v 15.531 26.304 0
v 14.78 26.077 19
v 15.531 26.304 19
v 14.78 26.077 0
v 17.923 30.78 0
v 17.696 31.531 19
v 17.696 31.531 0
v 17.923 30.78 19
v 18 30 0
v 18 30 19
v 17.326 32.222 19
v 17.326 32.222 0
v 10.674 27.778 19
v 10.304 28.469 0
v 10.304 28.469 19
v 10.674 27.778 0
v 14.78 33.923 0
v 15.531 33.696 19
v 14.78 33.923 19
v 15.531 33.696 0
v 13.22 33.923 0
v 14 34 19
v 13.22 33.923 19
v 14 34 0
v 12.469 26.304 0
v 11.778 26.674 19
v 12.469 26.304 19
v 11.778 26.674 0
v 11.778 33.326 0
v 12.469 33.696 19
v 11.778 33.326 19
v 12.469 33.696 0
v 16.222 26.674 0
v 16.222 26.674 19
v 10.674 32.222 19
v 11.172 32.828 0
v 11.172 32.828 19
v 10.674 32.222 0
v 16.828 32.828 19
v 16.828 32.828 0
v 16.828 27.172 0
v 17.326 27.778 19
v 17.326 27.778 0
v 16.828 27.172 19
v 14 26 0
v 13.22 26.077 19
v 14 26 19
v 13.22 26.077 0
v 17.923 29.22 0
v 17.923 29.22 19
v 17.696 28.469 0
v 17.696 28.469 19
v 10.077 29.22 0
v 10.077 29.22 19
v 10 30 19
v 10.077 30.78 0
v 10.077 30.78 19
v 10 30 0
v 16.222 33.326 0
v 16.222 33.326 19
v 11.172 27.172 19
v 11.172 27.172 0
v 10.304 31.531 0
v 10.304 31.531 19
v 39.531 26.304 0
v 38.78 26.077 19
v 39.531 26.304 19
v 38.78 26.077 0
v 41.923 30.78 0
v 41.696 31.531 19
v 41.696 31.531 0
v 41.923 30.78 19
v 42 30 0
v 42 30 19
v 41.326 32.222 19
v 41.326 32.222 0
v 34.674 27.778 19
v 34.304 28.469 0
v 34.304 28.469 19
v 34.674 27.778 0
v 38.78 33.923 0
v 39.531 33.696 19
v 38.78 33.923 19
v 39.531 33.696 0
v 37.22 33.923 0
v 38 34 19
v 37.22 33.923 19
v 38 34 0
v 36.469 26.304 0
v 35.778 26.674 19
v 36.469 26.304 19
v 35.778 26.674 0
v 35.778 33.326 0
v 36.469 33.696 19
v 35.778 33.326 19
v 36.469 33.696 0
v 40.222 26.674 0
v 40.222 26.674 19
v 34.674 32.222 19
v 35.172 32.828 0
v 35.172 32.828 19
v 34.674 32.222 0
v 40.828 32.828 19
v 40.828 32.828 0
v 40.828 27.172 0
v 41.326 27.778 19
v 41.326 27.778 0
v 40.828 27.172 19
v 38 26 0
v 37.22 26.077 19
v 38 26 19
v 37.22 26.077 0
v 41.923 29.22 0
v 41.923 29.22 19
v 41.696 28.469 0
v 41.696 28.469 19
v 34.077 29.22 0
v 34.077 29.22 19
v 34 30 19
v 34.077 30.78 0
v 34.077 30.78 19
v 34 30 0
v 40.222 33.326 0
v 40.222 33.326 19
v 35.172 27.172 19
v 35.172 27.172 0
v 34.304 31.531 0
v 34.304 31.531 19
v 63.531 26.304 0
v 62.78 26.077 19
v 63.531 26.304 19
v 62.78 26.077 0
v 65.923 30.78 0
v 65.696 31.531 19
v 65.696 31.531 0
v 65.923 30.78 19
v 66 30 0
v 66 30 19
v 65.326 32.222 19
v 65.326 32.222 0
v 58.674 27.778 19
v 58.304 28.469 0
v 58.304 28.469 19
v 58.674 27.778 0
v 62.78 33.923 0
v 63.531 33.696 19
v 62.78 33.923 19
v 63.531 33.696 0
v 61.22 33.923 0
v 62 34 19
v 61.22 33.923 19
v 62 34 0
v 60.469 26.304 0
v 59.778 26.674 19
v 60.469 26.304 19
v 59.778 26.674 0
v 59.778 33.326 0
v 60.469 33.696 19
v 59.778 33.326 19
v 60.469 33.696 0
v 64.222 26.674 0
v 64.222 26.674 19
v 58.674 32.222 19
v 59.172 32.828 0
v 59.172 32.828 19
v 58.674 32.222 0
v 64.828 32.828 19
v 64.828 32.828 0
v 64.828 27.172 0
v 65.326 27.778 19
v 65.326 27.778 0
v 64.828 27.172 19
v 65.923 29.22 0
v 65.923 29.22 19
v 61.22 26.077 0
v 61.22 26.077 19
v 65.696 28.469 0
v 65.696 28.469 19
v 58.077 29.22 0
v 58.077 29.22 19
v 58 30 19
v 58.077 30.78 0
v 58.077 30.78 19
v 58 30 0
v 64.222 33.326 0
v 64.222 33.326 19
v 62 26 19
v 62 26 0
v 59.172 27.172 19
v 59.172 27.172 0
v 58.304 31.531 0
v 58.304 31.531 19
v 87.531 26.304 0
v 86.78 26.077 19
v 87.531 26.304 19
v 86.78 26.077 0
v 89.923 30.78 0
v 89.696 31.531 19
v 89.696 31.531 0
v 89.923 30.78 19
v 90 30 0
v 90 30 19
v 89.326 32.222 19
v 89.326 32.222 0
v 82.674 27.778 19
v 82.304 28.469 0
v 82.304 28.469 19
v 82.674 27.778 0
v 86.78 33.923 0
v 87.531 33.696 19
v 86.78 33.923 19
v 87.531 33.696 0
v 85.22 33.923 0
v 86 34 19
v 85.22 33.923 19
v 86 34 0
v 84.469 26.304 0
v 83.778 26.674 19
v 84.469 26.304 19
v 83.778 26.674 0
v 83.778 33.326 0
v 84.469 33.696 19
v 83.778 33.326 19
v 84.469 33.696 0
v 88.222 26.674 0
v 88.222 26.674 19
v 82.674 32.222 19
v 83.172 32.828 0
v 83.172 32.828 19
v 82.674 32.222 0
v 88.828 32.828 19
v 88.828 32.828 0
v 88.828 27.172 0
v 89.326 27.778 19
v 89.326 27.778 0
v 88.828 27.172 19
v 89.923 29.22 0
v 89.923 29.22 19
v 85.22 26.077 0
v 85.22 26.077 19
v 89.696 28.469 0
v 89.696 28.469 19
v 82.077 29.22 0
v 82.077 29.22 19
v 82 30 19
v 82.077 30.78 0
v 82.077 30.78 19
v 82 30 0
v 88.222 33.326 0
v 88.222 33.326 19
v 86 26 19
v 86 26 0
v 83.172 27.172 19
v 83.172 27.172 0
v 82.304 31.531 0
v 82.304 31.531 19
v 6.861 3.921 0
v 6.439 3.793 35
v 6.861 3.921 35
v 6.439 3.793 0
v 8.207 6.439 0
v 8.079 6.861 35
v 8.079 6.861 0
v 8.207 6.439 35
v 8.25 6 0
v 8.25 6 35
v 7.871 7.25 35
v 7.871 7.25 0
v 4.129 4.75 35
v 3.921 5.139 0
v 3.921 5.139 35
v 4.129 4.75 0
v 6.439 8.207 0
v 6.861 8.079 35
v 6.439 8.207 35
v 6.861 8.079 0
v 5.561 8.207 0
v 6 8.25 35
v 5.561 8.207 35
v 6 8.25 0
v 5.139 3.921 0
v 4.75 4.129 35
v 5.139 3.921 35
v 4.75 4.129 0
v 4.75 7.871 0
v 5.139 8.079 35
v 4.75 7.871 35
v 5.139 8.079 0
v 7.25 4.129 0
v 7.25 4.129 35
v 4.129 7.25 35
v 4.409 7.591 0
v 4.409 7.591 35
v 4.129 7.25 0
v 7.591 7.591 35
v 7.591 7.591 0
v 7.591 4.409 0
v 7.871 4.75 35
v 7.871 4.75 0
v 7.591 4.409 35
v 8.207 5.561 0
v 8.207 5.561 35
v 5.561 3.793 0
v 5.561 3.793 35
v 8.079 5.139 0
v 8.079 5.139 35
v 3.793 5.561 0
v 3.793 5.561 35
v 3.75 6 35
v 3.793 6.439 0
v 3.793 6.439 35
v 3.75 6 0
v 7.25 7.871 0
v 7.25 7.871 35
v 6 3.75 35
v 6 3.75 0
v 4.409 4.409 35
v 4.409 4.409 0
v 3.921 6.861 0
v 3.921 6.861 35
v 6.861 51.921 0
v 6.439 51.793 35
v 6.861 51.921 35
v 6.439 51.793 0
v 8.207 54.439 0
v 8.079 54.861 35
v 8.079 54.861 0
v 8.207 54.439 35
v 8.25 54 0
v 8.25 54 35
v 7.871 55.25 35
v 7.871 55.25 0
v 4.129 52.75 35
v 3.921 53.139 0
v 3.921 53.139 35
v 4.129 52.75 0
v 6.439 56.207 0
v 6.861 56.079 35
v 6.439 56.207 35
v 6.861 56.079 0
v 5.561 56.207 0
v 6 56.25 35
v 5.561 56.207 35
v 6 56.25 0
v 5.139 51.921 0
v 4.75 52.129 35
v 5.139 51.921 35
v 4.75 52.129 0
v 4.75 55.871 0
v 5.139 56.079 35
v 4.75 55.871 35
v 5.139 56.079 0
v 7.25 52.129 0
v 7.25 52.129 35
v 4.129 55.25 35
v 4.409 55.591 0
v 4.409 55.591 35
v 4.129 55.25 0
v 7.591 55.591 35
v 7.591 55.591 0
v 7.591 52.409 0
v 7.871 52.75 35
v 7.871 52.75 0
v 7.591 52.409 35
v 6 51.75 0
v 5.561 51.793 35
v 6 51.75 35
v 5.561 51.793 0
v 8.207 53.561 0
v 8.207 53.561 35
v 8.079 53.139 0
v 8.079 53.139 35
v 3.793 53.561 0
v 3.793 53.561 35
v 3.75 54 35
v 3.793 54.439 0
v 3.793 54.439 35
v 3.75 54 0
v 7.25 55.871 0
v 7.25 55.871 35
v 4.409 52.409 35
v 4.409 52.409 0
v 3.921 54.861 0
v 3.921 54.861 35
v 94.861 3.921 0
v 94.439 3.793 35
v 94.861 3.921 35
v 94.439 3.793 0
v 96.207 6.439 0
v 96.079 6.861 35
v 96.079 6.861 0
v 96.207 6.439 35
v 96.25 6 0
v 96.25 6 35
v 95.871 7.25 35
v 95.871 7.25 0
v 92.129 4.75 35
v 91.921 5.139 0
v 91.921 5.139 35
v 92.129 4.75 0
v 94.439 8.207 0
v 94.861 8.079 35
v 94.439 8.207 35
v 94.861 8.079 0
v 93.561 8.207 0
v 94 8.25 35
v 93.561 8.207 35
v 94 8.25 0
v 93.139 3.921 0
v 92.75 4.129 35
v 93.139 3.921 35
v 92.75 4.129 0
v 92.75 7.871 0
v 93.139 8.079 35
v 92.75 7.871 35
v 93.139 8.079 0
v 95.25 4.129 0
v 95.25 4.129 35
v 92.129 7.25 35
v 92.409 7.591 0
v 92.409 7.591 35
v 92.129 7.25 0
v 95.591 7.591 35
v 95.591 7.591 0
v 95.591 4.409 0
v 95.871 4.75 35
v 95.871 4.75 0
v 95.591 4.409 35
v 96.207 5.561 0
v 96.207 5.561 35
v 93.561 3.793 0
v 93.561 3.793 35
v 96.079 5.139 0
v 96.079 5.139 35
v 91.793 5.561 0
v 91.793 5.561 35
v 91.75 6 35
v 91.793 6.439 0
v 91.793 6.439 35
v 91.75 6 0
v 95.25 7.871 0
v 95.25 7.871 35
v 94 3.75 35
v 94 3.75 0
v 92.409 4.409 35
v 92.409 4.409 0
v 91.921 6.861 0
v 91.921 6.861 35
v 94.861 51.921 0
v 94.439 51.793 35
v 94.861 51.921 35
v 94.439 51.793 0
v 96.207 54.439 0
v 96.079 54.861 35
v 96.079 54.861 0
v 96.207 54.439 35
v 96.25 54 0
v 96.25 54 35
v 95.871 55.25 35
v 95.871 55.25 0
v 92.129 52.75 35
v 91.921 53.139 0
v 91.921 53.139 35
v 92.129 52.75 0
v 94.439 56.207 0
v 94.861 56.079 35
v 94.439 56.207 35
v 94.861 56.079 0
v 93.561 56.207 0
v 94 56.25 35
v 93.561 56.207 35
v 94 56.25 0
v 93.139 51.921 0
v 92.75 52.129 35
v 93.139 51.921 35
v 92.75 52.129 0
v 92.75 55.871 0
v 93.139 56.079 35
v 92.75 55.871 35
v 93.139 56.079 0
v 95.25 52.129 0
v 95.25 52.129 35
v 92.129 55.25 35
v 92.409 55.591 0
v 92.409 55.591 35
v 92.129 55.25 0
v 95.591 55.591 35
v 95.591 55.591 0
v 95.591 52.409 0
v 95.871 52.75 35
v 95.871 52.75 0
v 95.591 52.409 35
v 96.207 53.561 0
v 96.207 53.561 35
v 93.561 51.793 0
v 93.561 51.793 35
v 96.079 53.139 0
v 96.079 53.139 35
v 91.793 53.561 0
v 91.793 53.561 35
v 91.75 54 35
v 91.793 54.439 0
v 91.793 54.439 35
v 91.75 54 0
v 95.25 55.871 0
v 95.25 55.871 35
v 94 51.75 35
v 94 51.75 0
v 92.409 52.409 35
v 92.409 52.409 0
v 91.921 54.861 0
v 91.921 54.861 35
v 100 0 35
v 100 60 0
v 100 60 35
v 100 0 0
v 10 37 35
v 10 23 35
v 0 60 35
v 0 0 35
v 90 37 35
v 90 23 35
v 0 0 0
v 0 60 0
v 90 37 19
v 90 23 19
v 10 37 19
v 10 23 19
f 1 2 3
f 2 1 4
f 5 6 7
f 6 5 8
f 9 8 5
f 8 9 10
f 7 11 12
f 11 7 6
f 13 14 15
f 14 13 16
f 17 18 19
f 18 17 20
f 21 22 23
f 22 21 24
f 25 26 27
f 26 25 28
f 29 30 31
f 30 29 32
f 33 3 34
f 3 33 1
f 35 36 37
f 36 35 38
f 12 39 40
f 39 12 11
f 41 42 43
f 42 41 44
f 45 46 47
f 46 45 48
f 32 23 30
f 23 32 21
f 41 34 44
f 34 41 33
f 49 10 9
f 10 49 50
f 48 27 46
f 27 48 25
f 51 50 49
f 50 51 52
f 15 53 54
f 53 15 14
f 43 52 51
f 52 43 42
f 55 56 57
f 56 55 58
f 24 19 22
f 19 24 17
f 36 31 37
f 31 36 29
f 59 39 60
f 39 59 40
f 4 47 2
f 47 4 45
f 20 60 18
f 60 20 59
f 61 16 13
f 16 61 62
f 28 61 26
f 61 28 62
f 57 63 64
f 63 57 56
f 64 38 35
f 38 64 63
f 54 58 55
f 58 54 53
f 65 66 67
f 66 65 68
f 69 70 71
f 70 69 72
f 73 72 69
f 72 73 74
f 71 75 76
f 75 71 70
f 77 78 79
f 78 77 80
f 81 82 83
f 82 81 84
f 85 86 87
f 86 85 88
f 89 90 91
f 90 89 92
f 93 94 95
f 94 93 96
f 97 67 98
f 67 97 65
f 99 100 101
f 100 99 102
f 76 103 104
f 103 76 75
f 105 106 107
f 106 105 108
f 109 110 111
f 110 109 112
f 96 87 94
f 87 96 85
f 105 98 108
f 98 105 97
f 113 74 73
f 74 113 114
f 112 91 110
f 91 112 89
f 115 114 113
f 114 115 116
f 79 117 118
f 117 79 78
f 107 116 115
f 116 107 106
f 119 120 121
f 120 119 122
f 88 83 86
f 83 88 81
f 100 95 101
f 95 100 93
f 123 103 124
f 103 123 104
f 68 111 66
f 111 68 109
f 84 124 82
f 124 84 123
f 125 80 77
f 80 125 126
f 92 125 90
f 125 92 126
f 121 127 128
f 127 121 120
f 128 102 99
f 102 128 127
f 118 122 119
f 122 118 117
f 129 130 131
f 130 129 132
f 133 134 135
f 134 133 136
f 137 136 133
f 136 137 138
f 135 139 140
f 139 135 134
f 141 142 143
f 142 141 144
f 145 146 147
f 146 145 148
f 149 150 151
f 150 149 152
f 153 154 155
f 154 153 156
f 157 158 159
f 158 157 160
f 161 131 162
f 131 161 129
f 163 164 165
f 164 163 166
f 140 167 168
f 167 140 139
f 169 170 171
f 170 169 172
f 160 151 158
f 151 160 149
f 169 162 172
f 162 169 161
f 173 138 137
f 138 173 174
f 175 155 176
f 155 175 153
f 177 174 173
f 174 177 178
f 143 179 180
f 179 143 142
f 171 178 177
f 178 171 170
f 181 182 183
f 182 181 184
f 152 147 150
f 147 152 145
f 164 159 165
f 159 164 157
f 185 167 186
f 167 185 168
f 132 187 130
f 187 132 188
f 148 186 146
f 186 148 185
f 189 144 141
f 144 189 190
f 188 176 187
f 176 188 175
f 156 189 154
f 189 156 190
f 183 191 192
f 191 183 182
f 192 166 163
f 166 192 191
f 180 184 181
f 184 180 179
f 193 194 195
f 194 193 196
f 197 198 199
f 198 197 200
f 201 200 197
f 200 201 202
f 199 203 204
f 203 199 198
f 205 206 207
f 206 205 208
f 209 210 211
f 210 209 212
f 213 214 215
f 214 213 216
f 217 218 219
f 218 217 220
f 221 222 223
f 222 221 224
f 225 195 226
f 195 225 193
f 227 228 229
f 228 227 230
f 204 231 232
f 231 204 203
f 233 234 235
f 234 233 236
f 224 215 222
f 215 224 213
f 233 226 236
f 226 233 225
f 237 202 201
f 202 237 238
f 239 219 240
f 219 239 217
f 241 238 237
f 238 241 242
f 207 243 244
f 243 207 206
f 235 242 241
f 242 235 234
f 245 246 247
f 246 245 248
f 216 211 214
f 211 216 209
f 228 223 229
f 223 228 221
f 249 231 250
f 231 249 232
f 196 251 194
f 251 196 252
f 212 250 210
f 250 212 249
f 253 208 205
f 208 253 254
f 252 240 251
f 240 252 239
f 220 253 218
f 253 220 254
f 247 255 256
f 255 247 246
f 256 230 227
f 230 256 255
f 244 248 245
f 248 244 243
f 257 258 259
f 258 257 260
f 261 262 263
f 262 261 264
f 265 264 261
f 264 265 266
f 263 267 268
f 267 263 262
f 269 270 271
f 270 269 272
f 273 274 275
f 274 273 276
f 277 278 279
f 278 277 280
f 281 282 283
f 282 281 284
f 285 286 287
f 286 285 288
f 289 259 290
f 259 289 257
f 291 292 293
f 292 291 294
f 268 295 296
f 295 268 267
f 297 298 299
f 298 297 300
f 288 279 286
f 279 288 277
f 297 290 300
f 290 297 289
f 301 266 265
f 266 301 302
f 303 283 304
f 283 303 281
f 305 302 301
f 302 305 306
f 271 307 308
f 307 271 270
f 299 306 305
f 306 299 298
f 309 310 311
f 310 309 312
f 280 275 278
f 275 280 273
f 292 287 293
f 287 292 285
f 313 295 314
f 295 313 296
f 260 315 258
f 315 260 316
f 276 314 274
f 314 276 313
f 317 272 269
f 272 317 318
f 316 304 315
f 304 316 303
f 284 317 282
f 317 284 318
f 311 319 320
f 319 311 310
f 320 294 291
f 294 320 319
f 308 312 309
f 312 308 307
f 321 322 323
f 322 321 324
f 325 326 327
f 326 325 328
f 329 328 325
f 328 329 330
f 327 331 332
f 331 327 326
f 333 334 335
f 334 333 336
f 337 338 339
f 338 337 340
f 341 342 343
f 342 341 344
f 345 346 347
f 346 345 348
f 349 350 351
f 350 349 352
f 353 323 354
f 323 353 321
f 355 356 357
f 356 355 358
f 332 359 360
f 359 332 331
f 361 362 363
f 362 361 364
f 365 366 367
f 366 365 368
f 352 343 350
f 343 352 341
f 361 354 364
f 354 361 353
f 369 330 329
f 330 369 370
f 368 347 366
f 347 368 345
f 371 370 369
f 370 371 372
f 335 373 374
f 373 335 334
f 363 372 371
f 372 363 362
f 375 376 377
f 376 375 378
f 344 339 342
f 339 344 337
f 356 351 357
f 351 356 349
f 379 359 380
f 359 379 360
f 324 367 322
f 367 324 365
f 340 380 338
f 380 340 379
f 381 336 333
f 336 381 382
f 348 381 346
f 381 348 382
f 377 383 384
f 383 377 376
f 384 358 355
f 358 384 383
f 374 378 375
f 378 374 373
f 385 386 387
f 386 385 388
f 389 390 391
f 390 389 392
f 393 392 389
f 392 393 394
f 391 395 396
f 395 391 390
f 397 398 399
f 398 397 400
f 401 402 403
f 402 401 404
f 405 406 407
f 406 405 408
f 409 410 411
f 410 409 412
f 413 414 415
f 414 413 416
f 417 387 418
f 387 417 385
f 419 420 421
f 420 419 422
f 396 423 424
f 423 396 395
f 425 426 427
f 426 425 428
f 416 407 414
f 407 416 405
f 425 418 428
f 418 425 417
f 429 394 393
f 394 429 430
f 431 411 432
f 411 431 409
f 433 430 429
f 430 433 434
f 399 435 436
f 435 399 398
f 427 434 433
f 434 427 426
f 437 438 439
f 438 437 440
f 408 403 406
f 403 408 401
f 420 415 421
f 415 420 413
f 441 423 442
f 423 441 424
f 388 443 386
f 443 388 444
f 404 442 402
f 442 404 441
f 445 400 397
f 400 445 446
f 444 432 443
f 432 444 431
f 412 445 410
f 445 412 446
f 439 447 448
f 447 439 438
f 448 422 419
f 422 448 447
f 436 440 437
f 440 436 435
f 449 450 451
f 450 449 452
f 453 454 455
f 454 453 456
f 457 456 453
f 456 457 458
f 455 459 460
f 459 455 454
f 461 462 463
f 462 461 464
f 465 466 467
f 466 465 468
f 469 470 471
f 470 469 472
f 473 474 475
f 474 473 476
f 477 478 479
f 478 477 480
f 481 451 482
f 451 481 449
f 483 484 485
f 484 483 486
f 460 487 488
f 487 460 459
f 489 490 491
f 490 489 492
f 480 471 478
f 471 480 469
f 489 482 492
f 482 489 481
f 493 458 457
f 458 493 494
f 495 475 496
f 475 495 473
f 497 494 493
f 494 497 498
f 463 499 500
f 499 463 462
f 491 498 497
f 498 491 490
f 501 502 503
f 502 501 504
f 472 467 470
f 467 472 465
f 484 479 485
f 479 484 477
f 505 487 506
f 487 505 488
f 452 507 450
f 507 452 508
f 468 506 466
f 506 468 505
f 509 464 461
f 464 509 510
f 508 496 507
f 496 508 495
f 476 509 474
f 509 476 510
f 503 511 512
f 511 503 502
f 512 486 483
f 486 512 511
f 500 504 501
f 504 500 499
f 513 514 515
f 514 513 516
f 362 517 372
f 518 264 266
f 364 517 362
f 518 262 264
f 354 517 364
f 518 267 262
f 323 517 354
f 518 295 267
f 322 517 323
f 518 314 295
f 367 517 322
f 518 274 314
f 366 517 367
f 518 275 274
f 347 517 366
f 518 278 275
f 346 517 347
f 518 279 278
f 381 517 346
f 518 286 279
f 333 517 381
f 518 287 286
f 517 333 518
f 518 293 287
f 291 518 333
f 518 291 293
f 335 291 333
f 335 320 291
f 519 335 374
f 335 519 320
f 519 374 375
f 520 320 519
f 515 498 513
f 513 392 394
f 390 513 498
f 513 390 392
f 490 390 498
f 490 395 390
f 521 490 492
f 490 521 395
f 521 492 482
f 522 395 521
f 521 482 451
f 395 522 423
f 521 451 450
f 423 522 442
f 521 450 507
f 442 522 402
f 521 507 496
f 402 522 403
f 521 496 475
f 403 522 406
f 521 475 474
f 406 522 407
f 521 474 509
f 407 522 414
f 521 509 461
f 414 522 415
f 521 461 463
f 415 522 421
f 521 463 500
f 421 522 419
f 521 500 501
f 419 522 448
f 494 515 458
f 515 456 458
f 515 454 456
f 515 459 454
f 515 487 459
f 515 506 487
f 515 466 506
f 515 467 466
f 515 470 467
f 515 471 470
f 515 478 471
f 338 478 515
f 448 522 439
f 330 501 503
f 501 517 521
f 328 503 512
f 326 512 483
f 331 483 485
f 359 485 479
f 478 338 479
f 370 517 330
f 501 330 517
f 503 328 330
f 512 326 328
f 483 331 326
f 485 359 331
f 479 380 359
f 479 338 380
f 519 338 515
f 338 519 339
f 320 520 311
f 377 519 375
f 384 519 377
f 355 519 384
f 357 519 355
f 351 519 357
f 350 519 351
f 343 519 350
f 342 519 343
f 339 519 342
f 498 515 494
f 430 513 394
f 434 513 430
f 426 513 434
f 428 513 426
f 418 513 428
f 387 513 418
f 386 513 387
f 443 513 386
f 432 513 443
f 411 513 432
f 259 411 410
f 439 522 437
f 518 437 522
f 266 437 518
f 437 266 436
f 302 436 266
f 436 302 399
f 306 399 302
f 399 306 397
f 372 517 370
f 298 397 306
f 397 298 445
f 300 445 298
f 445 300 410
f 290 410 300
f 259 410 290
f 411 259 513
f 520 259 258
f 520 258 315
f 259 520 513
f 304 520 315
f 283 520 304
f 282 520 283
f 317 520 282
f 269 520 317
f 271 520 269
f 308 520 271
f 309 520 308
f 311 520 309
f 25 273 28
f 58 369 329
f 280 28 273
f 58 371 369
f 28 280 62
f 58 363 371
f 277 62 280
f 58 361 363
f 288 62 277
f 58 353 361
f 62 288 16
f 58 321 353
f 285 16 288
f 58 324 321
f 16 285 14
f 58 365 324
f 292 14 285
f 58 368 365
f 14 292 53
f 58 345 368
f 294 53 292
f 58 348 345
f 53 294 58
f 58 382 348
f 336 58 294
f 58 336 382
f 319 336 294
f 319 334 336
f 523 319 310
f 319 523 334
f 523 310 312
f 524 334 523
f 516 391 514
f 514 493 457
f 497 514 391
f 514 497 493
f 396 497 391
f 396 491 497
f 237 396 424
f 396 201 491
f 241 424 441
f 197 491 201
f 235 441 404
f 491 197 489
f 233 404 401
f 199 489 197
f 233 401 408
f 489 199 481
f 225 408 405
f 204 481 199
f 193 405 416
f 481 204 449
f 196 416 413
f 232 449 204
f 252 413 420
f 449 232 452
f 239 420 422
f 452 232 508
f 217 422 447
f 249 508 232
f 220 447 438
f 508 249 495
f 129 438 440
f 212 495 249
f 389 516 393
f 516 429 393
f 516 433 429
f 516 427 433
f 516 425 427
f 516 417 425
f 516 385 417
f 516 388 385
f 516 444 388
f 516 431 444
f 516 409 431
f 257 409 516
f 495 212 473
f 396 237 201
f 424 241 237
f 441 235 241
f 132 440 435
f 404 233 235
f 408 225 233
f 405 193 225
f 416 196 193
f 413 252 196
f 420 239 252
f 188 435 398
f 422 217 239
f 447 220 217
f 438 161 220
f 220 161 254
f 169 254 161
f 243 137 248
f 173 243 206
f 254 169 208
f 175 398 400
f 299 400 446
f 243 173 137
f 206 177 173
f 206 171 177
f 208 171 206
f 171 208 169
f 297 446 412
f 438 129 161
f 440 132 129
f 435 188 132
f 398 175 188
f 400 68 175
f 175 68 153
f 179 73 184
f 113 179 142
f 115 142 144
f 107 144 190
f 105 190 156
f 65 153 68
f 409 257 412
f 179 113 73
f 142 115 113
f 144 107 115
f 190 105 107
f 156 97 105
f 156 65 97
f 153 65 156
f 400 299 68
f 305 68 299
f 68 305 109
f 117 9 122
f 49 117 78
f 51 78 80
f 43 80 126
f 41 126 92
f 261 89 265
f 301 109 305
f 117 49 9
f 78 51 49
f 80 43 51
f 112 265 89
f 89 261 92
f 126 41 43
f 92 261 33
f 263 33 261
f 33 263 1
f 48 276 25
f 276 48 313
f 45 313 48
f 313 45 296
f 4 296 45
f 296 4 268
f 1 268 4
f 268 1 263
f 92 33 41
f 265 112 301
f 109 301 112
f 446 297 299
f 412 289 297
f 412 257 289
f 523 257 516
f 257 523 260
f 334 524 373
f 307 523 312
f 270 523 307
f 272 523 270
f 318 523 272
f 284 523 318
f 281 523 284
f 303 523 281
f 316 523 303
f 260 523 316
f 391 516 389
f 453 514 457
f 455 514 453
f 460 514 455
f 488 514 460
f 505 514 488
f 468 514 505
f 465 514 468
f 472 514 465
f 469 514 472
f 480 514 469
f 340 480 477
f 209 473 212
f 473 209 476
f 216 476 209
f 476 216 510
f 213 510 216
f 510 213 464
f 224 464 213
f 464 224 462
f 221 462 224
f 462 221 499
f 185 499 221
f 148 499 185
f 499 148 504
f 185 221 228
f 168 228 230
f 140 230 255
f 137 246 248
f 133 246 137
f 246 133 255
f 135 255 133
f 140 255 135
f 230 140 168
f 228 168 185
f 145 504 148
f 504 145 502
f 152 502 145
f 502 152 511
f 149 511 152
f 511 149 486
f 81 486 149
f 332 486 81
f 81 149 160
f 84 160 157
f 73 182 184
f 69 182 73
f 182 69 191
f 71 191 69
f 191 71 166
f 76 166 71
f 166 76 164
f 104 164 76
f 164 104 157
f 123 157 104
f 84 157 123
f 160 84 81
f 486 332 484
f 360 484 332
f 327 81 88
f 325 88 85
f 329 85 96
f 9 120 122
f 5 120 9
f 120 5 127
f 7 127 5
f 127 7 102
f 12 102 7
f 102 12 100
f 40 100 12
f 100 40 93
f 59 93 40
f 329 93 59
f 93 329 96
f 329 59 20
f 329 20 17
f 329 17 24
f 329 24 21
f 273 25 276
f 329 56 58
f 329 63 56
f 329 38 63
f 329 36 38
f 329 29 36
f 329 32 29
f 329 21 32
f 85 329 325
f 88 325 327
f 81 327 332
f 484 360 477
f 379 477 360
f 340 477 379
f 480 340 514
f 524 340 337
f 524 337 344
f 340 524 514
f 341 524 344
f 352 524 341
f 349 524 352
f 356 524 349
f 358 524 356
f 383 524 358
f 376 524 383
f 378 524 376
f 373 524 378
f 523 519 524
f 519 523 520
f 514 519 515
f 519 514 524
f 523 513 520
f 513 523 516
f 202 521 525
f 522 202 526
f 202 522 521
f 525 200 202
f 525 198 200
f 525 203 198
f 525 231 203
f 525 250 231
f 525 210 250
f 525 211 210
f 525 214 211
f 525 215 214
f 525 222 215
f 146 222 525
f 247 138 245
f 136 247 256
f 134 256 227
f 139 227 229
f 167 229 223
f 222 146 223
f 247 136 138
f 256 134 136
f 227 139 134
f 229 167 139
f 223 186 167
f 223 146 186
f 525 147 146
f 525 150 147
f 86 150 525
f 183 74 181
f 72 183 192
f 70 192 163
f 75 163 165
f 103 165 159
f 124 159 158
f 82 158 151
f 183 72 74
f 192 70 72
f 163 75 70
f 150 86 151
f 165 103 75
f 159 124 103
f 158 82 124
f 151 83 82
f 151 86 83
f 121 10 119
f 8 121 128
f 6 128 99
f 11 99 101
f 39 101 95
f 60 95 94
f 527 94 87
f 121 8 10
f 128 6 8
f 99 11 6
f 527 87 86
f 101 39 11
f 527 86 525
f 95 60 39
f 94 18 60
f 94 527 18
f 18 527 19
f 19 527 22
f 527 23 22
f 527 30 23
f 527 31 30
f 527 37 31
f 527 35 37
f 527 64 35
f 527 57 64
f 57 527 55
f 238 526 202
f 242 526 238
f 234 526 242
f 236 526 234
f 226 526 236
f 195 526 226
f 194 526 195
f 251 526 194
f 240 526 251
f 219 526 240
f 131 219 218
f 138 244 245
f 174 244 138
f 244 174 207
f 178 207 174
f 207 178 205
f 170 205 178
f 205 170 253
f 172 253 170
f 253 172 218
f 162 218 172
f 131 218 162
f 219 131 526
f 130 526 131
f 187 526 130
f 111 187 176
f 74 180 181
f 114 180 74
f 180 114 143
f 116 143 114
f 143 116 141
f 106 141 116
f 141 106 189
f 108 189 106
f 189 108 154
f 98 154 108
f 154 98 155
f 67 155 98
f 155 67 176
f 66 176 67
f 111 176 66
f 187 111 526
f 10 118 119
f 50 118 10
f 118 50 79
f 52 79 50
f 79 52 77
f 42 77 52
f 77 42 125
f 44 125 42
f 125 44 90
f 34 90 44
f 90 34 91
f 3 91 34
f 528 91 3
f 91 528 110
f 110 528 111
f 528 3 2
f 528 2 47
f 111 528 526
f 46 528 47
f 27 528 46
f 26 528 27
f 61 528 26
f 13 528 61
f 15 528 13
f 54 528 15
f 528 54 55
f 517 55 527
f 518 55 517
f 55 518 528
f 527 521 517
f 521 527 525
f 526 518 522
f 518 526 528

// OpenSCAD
$fn = 32;

// ----------------------------------------------------------------------
// Manifold block: gallery_top manifold
// ----------------------------------------------------------------------

// --- parameters (mm) ---
block_l = 100;            // block length, X
block_w = 60;             // block width, Y
block_h = 35;             // block height, Z
port_d = 8;               // port bore diameter
port_pitch = 24;          // port pitch along X
gallery_d = 14;           // top gallery width, Y
gallery_depth = 16;       // gallery pocket depth
wall_p = 10;              // gallery end wall thickness, X
mnt_d = 4.5;              // mounting hole diameter
mnt_in = 6;               // mounting hole inset from the edges

n_ports = 4;  // ports in the row
port_x0 = (block_l - (n_ports - 1) * port_pitch) / 2;  // first port X

difference() {
  cube([block_l, block_w, block_h]);
  for (i = [0 : n_ports - 1])
    translate([port_x0 + i * port_pitch, block_w / 2, -1])
      cylinder(h = block_h + 2, d = port_d);
  translate([wall_p, block_w / 2 - gallery_d / 2, block_h - gallery_depth])
    cube([block_l - 2 * wall_p, gallery_d, gallery_depth + 1]);
  for (cx = [mnt_in, block_l - mnt_in])
    for (cy = [mnt_in, block_w - mnt_in])
      translate([cx, cy, -1]) cylinder(h = block_h + 2, d = mnt_d);
}
